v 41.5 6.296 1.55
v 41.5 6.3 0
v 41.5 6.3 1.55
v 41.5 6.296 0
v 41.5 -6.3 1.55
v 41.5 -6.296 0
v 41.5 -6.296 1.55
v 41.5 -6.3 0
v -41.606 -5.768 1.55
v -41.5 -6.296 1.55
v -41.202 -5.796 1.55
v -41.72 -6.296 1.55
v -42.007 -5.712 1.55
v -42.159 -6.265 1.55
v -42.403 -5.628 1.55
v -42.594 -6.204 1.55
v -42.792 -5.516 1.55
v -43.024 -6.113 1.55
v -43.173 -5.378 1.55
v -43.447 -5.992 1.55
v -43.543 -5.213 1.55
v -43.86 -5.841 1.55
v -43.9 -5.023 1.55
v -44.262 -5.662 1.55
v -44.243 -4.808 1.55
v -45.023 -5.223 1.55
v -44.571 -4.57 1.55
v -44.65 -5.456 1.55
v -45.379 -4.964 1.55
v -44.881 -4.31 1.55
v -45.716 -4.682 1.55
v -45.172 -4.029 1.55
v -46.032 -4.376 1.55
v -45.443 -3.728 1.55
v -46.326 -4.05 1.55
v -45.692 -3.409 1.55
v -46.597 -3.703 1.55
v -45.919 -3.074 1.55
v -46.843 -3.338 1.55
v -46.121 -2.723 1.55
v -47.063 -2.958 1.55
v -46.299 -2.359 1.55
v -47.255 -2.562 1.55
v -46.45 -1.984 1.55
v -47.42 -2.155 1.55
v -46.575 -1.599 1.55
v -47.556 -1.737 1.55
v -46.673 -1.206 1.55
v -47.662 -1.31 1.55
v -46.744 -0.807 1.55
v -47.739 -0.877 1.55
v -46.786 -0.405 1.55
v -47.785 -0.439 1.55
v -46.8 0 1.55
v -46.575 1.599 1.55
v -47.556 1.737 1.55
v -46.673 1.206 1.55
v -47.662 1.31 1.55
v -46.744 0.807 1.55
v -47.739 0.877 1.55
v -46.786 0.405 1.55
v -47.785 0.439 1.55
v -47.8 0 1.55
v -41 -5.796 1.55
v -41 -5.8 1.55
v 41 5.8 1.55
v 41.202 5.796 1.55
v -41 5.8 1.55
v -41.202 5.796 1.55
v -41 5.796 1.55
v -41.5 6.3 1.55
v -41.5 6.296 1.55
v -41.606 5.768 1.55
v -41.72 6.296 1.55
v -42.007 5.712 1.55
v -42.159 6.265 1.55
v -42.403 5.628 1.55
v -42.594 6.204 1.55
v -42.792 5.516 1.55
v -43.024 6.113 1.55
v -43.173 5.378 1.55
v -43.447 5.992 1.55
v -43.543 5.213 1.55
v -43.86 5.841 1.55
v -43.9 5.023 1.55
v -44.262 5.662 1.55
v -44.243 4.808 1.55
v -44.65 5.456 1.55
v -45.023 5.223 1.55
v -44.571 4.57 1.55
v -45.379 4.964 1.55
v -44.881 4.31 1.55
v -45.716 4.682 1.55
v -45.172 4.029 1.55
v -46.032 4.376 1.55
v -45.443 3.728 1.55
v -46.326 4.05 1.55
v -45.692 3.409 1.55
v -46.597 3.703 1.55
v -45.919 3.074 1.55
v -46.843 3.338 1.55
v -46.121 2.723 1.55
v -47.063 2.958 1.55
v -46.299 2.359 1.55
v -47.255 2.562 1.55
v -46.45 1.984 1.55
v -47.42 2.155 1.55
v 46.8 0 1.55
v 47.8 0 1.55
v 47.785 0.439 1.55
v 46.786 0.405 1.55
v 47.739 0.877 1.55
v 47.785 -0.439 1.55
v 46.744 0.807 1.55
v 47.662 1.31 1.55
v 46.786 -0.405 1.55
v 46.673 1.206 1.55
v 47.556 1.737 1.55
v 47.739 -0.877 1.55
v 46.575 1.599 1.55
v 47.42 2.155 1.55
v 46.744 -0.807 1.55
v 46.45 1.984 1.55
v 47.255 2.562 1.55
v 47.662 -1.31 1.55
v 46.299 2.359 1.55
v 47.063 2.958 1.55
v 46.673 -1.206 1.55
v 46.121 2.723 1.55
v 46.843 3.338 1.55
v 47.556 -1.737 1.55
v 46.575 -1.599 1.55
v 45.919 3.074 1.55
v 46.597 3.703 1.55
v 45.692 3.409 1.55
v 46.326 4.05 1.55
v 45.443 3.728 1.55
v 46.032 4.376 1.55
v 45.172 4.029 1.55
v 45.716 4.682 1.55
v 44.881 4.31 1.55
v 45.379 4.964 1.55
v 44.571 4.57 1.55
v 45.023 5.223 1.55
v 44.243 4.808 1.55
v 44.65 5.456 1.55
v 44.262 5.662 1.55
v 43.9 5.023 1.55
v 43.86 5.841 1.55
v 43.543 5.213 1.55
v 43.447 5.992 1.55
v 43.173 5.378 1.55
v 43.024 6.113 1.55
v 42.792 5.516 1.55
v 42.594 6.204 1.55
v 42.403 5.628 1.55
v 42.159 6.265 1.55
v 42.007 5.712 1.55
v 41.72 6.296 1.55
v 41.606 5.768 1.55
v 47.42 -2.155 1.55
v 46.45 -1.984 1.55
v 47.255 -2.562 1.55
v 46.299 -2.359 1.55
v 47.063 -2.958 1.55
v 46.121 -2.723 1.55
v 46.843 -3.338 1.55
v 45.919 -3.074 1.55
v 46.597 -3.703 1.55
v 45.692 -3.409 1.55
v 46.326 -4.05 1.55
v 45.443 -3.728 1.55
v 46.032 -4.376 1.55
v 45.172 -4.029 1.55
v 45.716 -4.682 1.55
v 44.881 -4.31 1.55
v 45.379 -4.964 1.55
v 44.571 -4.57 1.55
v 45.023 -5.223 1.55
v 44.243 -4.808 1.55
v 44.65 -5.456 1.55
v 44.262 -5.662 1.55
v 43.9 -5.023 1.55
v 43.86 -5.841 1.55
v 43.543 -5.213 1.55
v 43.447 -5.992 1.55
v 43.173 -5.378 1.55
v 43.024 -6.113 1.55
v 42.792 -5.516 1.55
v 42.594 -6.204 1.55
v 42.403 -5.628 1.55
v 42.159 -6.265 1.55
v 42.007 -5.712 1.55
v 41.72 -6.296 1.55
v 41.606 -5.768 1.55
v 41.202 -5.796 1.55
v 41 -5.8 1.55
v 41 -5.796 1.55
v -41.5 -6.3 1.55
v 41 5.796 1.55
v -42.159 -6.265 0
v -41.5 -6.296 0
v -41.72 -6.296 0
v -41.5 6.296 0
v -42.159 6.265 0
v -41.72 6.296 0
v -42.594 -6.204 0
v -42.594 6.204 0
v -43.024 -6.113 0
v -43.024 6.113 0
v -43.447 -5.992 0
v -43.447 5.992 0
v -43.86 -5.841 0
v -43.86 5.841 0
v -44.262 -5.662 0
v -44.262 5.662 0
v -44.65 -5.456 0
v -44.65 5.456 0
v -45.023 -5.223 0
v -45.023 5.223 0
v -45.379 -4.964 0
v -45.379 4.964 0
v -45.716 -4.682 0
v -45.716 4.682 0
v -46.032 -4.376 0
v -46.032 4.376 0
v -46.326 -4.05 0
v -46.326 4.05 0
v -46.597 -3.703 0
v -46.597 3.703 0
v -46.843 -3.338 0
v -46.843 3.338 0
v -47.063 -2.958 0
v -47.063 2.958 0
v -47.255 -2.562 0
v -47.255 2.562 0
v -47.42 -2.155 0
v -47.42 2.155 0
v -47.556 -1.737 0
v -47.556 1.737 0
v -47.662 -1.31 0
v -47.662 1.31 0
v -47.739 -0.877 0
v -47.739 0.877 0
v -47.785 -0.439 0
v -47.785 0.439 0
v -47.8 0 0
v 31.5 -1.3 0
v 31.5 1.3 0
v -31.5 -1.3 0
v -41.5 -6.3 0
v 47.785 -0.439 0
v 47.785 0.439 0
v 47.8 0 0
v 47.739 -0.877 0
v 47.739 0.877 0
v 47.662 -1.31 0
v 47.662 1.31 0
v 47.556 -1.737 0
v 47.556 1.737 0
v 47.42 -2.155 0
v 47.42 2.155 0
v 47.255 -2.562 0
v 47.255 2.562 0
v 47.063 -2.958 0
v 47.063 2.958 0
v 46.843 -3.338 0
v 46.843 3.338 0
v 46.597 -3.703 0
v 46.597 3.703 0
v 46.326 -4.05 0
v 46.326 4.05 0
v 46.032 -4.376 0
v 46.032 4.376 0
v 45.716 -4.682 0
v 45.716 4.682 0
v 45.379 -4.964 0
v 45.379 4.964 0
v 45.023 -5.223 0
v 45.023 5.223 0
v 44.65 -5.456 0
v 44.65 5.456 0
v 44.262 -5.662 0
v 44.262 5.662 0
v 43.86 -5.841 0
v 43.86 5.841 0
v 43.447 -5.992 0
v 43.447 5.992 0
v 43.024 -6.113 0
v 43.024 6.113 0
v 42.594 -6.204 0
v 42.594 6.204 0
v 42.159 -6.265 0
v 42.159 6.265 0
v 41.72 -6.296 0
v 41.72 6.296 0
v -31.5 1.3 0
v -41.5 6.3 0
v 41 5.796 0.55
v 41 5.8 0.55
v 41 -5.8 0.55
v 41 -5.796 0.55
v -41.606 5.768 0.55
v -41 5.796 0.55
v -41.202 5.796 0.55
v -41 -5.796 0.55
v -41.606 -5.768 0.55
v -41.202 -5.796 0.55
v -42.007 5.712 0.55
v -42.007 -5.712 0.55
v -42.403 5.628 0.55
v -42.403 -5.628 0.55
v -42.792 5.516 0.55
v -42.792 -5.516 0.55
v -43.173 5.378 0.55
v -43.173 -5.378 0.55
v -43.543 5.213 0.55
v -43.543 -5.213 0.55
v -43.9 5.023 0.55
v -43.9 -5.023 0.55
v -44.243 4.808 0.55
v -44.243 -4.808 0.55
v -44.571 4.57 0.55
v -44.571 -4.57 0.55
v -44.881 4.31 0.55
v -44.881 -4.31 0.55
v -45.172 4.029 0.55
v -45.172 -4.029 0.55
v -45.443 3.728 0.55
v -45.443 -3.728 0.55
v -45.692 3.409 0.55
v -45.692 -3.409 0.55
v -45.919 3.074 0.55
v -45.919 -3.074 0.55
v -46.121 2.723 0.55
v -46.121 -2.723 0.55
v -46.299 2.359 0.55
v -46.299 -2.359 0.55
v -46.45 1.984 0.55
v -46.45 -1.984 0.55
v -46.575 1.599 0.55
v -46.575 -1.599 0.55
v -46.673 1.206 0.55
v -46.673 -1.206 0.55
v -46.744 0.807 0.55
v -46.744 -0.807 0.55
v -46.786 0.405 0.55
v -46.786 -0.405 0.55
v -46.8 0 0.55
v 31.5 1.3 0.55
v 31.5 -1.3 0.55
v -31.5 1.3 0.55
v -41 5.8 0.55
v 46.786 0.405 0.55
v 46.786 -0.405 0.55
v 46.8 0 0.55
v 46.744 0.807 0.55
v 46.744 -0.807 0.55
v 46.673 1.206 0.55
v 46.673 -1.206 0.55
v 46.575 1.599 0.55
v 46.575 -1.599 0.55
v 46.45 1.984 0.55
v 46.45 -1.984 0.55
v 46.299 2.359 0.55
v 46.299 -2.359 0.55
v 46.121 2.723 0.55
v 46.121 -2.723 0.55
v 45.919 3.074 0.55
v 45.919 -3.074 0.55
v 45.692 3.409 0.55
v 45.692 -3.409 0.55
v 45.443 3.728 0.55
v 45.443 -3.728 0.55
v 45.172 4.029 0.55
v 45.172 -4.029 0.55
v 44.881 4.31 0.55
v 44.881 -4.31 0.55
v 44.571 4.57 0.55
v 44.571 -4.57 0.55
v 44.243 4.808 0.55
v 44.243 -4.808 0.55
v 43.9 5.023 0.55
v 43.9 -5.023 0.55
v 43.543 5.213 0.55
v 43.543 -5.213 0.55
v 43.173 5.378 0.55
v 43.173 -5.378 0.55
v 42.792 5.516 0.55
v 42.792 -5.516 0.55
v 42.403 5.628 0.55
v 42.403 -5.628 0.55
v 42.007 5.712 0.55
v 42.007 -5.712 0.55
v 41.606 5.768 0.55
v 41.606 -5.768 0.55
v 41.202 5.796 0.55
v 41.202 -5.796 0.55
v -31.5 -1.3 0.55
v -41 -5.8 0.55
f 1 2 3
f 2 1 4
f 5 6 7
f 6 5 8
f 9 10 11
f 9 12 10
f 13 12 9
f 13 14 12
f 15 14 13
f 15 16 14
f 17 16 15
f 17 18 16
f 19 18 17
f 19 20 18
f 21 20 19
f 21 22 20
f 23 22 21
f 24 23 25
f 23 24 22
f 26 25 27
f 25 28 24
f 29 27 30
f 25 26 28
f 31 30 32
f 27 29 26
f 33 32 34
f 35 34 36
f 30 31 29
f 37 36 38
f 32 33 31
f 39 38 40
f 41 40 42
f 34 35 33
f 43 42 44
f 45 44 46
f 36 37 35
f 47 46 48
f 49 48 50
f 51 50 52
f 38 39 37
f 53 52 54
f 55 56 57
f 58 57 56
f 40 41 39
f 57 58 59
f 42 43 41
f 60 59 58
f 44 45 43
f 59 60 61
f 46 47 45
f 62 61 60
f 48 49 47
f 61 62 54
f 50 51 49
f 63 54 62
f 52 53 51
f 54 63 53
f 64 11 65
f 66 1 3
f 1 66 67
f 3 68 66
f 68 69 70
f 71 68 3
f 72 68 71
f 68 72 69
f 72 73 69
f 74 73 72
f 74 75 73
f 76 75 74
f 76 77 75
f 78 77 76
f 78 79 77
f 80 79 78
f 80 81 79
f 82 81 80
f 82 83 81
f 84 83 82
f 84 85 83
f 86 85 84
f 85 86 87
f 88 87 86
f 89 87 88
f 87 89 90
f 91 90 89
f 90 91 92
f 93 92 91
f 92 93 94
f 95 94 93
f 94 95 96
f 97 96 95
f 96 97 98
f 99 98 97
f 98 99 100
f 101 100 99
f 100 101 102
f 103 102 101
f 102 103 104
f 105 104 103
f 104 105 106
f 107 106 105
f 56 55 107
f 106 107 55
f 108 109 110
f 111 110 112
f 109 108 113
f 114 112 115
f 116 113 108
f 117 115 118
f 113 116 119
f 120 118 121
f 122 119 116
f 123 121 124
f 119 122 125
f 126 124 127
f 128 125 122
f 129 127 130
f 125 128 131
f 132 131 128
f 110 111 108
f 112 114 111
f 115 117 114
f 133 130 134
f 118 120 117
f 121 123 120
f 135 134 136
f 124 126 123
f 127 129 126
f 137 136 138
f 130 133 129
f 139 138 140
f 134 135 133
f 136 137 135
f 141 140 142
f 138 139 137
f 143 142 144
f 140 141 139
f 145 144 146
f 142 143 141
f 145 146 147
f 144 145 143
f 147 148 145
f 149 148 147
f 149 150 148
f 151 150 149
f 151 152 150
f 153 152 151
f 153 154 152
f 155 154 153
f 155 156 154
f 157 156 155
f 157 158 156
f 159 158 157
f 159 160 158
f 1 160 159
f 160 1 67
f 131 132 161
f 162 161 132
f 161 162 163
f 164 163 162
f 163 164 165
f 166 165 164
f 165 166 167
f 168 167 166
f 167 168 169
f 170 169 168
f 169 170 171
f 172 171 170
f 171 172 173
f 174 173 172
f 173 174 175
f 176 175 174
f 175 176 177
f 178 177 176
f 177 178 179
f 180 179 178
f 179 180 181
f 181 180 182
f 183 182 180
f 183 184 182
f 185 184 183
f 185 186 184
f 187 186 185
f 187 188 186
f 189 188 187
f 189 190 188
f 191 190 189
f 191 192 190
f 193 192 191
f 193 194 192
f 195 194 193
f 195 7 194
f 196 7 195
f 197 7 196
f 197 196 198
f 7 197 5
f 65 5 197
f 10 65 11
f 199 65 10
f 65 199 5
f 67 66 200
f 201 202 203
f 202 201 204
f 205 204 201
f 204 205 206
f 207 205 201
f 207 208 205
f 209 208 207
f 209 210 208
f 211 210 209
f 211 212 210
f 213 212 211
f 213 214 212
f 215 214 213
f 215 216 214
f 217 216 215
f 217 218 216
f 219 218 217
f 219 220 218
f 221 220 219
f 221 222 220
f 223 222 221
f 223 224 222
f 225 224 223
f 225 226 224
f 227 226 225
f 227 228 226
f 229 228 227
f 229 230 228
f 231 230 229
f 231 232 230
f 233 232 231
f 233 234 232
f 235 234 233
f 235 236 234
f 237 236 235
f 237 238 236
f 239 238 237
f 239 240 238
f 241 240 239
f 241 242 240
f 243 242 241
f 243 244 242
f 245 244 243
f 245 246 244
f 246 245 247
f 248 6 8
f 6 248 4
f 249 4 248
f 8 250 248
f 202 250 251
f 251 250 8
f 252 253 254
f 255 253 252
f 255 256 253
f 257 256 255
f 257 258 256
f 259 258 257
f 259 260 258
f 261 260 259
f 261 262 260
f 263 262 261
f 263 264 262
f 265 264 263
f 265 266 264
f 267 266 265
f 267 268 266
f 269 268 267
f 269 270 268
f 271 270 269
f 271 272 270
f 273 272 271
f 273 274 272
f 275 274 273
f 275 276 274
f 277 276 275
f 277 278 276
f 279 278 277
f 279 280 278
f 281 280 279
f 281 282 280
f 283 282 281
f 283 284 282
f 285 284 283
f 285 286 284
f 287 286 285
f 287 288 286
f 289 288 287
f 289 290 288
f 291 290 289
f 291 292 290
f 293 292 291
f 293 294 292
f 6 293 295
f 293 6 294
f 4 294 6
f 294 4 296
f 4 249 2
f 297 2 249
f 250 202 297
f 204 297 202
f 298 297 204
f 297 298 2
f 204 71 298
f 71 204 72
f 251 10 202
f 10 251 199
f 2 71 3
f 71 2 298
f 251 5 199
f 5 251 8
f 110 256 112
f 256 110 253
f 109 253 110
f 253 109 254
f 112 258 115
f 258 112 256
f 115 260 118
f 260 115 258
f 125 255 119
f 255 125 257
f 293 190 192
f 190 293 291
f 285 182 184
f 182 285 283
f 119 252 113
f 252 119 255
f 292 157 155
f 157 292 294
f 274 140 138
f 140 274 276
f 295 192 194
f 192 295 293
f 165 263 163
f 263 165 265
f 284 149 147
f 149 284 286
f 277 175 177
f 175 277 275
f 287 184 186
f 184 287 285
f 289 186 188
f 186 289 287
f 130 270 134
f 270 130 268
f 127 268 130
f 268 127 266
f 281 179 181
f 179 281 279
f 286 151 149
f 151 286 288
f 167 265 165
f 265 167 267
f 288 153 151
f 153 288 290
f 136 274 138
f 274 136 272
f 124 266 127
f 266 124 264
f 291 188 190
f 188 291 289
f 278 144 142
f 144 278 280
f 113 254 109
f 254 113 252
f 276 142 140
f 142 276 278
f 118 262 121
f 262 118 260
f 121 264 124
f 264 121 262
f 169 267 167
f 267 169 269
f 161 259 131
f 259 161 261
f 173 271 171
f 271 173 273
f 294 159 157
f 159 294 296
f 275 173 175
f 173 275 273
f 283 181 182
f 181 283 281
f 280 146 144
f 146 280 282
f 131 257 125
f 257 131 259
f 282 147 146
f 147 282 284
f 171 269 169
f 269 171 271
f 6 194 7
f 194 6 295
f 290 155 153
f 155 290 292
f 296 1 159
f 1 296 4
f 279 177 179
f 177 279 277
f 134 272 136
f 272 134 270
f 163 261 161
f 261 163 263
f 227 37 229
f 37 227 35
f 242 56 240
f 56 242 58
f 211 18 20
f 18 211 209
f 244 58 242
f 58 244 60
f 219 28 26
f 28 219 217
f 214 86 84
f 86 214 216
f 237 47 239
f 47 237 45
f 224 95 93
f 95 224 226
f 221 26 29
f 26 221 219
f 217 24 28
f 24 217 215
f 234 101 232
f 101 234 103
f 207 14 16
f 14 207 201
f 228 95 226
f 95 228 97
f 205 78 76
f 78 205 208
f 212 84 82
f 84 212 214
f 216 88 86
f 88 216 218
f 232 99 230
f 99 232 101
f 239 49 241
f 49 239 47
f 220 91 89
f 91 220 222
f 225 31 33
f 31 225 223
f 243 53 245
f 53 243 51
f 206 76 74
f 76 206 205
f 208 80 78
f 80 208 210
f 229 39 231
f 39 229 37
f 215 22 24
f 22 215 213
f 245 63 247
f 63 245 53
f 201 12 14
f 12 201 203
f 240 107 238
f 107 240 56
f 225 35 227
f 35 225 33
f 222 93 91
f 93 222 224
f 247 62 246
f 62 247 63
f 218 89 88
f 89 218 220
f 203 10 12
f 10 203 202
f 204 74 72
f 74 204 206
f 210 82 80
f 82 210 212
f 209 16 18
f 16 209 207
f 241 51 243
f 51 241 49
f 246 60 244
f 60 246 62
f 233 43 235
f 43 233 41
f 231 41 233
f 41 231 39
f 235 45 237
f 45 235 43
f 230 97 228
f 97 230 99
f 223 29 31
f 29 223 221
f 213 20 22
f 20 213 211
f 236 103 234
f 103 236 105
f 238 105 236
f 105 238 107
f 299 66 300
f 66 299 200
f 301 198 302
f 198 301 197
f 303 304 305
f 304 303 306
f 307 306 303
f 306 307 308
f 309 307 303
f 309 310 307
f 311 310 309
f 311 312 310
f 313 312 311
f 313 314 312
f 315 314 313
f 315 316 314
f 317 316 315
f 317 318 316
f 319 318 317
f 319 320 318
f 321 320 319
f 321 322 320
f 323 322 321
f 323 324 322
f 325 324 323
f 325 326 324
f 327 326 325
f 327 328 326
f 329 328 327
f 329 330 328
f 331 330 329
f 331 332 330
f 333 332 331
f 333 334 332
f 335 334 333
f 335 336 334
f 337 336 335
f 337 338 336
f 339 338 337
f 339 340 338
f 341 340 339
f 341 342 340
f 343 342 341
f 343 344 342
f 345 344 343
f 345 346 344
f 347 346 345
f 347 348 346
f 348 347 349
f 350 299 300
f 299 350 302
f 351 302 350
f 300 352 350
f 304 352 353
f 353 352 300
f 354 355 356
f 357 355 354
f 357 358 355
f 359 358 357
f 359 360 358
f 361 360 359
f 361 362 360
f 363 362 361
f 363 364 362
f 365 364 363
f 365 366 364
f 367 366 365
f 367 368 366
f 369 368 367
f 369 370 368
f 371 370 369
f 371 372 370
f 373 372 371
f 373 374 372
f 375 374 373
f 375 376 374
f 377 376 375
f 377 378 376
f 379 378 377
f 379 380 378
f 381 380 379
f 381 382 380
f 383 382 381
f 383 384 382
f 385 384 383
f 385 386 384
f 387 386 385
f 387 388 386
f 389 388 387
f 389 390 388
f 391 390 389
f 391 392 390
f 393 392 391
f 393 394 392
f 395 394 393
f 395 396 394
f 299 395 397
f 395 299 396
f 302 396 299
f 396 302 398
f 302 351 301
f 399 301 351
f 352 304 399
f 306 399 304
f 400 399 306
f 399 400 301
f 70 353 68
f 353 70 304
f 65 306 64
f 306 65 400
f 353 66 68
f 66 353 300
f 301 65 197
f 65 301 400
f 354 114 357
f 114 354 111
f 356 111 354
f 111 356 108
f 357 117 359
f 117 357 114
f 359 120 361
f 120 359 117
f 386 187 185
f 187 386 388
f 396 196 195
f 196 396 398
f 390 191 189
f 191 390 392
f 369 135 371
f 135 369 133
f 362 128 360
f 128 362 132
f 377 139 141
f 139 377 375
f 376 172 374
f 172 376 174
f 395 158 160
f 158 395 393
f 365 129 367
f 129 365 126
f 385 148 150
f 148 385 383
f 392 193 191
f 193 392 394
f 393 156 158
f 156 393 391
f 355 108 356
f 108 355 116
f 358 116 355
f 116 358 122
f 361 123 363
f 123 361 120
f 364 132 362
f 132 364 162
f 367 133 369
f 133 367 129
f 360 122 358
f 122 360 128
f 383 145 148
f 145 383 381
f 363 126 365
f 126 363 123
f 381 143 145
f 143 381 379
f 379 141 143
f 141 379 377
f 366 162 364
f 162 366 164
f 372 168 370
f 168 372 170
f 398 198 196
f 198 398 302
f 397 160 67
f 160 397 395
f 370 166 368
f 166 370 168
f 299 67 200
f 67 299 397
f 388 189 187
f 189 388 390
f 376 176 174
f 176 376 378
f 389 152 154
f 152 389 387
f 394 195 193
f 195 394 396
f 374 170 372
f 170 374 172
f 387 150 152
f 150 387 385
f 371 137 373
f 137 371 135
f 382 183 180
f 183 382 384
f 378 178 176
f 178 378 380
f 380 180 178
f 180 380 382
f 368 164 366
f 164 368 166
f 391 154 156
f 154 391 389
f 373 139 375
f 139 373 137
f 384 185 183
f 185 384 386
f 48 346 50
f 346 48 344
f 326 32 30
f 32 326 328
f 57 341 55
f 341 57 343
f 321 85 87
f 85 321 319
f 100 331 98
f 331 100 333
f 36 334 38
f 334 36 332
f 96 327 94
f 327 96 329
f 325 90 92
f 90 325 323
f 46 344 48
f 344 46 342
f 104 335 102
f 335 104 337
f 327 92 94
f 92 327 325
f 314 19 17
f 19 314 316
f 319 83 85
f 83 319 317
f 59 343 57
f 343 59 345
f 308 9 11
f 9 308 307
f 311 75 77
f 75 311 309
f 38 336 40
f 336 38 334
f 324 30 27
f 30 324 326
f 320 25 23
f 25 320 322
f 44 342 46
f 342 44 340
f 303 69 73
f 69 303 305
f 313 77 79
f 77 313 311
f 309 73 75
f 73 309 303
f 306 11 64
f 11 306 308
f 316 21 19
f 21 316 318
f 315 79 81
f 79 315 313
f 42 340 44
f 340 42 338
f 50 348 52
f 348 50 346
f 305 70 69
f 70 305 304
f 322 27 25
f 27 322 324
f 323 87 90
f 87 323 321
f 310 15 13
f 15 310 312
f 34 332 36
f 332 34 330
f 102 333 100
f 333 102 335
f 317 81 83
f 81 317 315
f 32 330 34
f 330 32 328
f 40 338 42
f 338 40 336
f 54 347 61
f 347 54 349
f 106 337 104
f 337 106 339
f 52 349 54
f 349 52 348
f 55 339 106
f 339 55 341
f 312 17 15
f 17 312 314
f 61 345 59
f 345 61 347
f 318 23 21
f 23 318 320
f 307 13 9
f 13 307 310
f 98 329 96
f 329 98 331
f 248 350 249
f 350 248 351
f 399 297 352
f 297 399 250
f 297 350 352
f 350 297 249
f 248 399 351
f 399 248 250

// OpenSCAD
// Maximum width of the fretboard
fretBoardWidth = 63;
// Width of a fret
fretWidth = 2.6;
// Height of a fret
fretHeight = 1.1;
// Calculated parameters, don't touch!
baseWidth = fretBoardWidth + 20;
baseLength = fretWidth + 2*5;
baseHeight = fretHeight/2;
edgeWidth = 1*1;
edgeHeight = 1*1;
$fn=90*1;

module base(width, length, height) {
   translate([0,0, height/2]) { 
        cube([width, length, height], true);
        translate([width/2, 0, -height/2]) {
            cylinder(height, d=length, true);
        }
        translate([-width/2, 0, -height/2]) {
            cylinder(height, d=length, true);
        }    
    }
}

module cutout() {
    cube([fretBoardWidth, fretWidth, (baseHeight+edgeHeight)*2], true);
}


difference() {
    base(baseWidth, baseLength, baseHeight + edgeHeight);
    translate([0, 0, baseHeight]) {
        base(baseWidth-edgeWidth, baseLength-edgeWidth, edgeHeight*2);
    }
    cutout();
}
